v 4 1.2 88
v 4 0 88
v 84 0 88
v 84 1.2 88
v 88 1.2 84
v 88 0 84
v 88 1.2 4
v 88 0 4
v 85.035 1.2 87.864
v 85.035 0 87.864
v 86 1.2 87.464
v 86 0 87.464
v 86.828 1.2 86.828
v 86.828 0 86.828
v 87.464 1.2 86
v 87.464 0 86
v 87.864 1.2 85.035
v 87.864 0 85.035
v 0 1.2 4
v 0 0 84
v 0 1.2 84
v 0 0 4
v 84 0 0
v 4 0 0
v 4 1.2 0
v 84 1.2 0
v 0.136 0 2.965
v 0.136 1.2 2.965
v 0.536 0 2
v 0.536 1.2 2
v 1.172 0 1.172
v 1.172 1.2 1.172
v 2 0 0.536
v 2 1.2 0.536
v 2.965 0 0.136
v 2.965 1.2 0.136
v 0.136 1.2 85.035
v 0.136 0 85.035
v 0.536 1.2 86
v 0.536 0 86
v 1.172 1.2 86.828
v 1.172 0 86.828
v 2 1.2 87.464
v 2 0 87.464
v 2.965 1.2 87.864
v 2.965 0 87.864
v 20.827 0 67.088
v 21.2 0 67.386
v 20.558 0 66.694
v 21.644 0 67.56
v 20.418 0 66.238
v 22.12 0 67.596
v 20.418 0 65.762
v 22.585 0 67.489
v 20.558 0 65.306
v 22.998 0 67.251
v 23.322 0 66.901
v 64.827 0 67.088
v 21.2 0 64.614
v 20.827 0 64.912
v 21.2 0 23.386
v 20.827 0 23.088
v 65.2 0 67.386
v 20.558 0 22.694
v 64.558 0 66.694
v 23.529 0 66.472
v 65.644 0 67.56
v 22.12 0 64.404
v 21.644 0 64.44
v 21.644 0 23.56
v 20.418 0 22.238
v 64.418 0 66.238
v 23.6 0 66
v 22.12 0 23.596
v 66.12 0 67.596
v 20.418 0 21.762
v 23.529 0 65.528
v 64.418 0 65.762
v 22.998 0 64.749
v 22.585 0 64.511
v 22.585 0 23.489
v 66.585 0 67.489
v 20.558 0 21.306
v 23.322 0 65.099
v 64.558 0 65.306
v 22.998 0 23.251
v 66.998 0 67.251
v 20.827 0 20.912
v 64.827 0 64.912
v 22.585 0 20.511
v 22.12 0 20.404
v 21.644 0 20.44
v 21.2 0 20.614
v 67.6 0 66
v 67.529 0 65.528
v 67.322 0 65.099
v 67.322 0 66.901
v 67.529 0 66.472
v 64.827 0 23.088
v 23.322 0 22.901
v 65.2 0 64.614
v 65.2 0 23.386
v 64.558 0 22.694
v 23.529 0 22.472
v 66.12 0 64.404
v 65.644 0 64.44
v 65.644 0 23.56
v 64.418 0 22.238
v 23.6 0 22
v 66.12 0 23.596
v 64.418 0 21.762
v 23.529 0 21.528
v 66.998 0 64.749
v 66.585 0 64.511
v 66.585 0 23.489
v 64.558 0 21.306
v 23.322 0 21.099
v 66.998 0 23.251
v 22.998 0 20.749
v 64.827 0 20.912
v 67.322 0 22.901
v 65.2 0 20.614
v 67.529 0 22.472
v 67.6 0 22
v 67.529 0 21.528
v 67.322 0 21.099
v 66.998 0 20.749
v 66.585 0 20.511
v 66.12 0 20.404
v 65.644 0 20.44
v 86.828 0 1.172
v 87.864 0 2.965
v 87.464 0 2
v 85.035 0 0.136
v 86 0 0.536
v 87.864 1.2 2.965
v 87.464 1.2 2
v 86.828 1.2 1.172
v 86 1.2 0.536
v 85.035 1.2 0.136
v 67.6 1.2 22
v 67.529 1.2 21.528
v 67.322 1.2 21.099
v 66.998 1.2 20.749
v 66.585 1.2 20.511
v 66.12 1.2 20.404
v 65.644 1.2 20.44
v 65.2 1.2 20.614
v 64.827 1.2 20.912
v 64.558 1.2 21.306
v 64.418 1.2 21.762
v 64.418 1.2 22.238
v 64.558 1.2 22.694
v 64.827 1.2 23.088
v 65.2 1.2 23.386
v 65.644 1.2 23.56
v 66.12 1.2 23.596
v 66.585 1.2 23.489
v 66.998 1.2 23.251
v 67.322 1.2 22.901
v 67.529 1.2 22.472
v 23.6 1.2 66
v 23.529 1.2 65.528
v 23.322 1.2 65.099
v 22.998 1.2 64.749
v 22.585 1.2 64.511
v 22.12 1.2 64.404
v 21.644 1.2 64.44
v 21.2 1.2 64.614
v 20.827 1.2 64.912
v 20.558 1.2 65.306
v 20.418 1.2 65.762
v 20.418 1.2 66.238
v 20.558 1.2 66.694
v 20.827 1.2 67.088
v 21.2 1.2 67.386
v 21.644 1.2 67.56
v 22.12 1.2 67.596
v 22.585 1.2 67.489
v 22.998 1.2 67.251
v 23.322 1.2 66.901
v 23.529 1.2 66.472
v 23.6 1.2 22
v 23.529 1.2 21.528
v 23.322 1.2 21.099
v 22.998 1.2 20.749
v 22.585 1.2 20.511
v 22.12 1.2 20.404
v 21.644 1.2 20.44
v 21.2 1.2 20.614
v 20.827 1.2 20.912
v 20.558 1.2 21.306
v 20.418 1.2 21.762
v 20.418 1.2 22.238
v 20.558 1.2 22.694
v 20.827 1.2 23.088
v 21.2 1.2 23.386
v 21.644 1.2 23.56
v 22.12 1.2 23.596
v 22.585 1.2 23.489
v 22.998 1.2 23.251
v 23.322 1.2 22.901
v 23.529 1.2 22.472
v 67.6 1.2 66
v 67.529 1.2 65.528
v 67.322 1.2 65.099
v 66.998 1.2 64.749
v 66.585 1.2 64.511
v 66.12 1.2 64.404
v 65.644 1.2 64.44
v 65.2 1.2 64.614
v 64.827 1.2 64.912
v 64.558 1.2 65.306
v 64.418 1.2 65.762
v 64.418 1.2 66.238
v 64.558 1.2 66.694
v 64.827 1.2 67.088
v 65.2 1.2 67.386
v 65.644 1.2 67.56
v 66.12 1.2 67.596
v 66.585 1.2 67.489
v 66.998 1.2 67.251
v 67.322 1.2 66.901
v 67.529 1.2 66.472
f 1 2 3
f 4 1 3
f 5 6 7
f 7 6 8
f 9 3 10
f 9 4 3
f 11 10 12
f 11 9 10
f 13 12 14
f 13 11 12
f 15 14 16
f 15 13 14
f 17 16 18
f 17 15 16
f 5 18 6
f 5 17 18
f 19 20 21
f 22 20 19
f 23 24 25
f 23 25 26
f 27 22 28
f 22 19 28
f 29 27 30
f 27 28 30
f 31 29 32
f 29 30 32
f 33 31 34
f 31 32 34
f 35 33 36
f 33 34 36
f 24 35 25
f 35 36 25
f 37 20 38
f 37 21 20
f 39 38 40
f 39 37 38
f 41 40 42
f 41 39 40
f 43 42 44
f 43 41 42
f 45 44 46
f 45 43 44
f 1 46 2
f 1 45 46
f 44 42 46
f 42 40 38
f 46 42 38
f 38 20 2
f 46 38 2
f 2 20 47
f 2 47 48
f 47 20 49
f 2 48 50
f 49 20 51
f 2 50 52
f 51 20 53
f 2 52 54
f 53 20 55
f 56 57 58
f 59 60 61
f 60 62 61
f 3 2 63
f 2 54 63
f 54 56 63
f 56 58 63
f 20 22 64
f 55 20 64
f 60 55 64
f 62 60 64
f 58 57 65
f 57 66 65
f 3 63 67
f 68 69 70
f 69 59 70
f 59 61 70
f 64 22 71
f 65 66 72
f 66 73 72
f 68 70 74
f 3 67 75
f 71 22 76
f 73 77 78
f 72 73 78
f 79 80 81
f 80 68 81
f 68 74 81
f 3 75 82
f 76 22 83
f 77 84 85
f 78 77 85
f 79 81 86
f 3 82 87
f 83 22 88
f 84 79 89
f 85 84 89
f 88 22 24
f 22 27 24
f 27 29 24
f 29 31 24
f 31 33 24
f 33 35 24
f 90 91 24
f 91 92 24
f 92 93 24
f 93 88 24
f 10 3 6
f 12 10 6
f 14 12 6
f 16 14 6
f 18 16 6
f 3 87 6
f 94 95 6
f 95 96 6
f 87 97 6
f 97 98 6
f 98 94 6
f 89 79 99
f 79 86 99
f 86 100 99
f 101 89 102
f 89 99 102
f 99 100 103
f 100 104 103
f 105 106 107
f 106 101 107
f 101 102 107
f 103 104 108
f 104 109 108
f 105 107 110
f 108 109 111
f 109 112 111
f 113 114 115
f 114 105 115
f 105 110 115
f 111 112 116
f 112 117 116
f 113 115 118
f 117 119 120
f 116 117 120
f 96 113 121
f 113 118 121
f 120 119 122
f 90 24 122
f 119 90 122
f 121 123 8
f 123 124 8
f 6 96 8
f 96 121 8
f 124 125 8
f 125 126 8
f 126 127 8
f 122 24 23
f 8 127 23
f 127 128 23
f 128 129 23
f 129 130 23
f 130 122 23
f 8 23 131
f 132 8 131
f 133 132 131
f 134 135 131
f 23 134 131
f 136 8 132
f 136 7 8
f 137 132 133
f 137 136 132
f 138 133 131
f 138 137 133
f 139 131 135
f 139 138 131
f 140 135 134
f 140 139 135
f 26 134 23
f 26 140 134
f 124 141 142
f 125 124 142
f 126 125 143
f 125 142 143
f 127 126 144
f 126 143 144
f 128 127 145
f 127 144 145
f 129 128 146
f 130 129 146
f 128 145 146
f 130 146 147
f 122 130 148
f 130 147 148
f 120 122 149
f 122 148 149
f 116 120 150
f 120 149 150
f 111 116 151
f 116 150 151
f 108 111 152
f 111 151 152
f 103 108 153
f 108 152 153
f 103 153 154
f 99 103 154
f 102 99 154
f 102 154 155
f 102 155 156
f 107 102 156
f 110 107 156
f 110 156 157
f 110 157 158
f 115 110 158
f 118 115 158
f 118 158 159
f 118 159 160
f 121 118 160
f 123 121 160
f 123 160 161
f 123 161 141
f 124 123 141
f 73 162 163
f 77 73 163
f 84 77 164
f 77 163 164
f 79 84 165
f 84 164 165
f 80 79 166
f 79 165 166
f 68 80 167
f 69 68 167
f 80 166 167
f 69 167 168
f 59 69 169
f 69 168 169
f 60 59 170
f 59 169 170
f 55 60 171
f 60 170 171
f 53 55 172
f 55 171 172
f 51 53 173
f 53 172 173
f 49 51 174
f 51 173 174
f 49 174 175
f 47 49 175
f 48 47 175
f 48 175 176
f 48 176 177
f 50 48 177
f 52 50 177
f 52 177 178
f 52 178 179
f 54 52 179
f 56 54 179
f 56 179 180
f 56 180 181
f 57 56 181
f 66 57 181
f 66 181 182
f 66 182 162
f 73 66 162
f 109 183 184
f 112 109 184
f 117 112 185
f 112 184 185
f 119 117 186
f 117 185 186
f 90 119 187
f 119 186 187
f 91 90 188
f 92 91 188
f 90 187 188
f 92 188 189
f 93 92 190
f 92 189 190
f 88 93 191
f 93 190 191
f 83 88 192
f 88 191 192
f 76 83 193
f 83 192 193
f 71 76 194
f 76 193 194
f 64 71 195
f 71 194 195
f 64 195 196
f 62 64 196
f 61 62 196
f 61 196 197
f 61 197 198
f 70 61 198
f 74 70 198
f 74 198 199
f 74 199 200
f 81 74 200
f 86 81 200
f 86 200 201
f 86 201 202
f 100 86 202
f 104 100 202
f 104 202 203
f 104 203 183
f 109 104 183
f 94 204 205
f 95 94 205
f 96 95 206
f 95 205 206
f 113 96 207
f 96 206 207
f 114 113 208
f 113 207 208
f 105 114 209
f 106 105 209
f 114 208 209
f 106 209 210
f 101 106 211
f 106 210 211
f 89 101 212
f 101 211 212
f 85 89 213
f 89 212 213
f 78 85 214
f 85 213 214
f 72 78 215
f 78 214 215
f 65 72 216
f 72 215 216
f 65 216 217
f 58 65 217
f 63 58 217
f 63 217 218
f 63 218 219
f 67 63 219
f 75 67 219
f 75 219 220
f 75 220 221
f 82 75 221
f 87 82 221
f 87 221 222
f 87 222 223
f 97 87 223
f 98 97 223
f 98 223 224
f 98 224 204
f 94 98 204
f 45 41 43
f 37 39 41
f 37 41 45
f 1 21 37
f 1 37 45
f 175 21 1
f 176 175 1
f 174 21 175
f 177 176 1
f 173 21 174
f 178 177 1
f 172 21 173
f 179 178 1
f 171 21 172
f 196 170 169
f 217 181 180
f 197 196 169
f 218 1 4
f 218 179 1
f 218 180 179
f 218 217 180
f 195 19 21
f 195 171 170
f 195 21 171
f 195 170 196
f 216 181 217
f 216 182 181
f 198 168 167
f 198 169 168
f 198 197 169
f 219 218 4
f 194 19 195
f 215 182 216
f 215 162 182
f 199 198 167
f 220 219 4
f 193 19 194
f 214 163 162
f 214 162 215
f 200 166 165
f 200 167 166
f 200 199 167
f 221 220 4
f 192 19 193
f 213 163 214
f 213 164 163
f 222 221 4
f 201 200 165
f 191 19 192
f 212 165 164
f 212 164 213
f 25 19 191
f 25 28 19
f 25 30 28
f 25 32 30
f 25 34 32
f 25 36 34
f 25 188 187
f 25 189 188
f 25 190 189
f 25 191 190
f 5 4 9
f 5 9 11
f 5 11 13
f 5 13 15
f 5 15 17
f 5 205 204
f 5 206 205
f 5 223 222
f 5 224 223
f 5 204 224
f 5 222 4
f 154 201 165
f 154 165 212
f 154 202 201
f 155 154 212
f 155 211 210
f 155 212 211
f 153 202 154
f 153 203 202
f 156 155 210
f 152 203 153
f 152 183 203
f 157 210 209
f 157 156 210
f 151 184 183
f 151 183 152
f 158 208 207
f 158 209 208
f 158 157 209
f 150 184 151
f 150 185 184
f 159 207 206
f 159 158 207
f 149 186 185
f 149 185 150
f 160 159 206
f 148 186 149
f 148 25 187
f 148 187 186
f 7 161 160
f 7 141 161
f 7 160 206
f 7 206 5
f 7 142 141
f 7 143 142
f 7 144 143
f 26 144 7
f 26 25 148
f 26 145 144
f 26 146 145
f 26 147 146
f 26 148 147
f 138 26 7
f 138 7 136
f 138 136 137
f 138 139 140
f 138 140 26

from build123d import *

# Parameters (mm, degrees)
SKETCH_1_W               = 88
SKETCH_1_H               = 88
EXTRUDE_1_DEPTH          = 1.2
FILLET_1_R               = 4
SKETCH_2_R               = 1.6
CUT_EXTRUDE_1_DEPTH      = 10
CUT_EXTRUDE_1_DEPTH_BACK = 2.2


with BuildPart() as part:
    # 草图1 → 凸台-拉伸1 (new body)
    with BuildSketch(Plane(origin=(0, 0, 0), x_dir=(1, 0, 0), z_dir=(0, 1, 0))):
        with Locations((44, -44)):
            Rectangle(SKETCH_1_W, SKETCH_1_H)
    extrude(amount=EXTRUDE_1_DEPTH)

    # 圆角1
    fillet_1_edges = [part.edges().sort_by_distance(p)[0] for p in [
        (0, 0.6, 0),
        (88, 0.6, 0),
        (88, 0.6, 88),
        (0, 0.6, 88),
    ]]
    fillet(fillet_1_edges, radius=FILLET_1_R)

    # 草图2 → 切除-拉伸1 (cut, two sides)
    with BuildSketch(Plane(origin=(0, 1.2, 0), x_dir=(1, 0, 0), z_dir=(0, 1, 0))) as cut_extrude_1_sk:
        with Locations((22, -22)):
            Circle(SKETCH_2_R)
        with Locations((66, -22)):
            Circle(SKETCH_2_R)
        with Locations((66, -66)):
            Circle(SKETCH_2_R)
        with Locations((22, -66)):
            Circle(SKETCH_2_R)
    extrude(amount=CUT_EXTRUDE_1_DEPTH, mode=Mode.SUBTRACT)
    extrude(cut_extrude_1_sk.sketch, amount=-CUT_EXTRUDE_1_DEPTH_BACK, mode=Mode.SUBTRACT)


solid = part.part
